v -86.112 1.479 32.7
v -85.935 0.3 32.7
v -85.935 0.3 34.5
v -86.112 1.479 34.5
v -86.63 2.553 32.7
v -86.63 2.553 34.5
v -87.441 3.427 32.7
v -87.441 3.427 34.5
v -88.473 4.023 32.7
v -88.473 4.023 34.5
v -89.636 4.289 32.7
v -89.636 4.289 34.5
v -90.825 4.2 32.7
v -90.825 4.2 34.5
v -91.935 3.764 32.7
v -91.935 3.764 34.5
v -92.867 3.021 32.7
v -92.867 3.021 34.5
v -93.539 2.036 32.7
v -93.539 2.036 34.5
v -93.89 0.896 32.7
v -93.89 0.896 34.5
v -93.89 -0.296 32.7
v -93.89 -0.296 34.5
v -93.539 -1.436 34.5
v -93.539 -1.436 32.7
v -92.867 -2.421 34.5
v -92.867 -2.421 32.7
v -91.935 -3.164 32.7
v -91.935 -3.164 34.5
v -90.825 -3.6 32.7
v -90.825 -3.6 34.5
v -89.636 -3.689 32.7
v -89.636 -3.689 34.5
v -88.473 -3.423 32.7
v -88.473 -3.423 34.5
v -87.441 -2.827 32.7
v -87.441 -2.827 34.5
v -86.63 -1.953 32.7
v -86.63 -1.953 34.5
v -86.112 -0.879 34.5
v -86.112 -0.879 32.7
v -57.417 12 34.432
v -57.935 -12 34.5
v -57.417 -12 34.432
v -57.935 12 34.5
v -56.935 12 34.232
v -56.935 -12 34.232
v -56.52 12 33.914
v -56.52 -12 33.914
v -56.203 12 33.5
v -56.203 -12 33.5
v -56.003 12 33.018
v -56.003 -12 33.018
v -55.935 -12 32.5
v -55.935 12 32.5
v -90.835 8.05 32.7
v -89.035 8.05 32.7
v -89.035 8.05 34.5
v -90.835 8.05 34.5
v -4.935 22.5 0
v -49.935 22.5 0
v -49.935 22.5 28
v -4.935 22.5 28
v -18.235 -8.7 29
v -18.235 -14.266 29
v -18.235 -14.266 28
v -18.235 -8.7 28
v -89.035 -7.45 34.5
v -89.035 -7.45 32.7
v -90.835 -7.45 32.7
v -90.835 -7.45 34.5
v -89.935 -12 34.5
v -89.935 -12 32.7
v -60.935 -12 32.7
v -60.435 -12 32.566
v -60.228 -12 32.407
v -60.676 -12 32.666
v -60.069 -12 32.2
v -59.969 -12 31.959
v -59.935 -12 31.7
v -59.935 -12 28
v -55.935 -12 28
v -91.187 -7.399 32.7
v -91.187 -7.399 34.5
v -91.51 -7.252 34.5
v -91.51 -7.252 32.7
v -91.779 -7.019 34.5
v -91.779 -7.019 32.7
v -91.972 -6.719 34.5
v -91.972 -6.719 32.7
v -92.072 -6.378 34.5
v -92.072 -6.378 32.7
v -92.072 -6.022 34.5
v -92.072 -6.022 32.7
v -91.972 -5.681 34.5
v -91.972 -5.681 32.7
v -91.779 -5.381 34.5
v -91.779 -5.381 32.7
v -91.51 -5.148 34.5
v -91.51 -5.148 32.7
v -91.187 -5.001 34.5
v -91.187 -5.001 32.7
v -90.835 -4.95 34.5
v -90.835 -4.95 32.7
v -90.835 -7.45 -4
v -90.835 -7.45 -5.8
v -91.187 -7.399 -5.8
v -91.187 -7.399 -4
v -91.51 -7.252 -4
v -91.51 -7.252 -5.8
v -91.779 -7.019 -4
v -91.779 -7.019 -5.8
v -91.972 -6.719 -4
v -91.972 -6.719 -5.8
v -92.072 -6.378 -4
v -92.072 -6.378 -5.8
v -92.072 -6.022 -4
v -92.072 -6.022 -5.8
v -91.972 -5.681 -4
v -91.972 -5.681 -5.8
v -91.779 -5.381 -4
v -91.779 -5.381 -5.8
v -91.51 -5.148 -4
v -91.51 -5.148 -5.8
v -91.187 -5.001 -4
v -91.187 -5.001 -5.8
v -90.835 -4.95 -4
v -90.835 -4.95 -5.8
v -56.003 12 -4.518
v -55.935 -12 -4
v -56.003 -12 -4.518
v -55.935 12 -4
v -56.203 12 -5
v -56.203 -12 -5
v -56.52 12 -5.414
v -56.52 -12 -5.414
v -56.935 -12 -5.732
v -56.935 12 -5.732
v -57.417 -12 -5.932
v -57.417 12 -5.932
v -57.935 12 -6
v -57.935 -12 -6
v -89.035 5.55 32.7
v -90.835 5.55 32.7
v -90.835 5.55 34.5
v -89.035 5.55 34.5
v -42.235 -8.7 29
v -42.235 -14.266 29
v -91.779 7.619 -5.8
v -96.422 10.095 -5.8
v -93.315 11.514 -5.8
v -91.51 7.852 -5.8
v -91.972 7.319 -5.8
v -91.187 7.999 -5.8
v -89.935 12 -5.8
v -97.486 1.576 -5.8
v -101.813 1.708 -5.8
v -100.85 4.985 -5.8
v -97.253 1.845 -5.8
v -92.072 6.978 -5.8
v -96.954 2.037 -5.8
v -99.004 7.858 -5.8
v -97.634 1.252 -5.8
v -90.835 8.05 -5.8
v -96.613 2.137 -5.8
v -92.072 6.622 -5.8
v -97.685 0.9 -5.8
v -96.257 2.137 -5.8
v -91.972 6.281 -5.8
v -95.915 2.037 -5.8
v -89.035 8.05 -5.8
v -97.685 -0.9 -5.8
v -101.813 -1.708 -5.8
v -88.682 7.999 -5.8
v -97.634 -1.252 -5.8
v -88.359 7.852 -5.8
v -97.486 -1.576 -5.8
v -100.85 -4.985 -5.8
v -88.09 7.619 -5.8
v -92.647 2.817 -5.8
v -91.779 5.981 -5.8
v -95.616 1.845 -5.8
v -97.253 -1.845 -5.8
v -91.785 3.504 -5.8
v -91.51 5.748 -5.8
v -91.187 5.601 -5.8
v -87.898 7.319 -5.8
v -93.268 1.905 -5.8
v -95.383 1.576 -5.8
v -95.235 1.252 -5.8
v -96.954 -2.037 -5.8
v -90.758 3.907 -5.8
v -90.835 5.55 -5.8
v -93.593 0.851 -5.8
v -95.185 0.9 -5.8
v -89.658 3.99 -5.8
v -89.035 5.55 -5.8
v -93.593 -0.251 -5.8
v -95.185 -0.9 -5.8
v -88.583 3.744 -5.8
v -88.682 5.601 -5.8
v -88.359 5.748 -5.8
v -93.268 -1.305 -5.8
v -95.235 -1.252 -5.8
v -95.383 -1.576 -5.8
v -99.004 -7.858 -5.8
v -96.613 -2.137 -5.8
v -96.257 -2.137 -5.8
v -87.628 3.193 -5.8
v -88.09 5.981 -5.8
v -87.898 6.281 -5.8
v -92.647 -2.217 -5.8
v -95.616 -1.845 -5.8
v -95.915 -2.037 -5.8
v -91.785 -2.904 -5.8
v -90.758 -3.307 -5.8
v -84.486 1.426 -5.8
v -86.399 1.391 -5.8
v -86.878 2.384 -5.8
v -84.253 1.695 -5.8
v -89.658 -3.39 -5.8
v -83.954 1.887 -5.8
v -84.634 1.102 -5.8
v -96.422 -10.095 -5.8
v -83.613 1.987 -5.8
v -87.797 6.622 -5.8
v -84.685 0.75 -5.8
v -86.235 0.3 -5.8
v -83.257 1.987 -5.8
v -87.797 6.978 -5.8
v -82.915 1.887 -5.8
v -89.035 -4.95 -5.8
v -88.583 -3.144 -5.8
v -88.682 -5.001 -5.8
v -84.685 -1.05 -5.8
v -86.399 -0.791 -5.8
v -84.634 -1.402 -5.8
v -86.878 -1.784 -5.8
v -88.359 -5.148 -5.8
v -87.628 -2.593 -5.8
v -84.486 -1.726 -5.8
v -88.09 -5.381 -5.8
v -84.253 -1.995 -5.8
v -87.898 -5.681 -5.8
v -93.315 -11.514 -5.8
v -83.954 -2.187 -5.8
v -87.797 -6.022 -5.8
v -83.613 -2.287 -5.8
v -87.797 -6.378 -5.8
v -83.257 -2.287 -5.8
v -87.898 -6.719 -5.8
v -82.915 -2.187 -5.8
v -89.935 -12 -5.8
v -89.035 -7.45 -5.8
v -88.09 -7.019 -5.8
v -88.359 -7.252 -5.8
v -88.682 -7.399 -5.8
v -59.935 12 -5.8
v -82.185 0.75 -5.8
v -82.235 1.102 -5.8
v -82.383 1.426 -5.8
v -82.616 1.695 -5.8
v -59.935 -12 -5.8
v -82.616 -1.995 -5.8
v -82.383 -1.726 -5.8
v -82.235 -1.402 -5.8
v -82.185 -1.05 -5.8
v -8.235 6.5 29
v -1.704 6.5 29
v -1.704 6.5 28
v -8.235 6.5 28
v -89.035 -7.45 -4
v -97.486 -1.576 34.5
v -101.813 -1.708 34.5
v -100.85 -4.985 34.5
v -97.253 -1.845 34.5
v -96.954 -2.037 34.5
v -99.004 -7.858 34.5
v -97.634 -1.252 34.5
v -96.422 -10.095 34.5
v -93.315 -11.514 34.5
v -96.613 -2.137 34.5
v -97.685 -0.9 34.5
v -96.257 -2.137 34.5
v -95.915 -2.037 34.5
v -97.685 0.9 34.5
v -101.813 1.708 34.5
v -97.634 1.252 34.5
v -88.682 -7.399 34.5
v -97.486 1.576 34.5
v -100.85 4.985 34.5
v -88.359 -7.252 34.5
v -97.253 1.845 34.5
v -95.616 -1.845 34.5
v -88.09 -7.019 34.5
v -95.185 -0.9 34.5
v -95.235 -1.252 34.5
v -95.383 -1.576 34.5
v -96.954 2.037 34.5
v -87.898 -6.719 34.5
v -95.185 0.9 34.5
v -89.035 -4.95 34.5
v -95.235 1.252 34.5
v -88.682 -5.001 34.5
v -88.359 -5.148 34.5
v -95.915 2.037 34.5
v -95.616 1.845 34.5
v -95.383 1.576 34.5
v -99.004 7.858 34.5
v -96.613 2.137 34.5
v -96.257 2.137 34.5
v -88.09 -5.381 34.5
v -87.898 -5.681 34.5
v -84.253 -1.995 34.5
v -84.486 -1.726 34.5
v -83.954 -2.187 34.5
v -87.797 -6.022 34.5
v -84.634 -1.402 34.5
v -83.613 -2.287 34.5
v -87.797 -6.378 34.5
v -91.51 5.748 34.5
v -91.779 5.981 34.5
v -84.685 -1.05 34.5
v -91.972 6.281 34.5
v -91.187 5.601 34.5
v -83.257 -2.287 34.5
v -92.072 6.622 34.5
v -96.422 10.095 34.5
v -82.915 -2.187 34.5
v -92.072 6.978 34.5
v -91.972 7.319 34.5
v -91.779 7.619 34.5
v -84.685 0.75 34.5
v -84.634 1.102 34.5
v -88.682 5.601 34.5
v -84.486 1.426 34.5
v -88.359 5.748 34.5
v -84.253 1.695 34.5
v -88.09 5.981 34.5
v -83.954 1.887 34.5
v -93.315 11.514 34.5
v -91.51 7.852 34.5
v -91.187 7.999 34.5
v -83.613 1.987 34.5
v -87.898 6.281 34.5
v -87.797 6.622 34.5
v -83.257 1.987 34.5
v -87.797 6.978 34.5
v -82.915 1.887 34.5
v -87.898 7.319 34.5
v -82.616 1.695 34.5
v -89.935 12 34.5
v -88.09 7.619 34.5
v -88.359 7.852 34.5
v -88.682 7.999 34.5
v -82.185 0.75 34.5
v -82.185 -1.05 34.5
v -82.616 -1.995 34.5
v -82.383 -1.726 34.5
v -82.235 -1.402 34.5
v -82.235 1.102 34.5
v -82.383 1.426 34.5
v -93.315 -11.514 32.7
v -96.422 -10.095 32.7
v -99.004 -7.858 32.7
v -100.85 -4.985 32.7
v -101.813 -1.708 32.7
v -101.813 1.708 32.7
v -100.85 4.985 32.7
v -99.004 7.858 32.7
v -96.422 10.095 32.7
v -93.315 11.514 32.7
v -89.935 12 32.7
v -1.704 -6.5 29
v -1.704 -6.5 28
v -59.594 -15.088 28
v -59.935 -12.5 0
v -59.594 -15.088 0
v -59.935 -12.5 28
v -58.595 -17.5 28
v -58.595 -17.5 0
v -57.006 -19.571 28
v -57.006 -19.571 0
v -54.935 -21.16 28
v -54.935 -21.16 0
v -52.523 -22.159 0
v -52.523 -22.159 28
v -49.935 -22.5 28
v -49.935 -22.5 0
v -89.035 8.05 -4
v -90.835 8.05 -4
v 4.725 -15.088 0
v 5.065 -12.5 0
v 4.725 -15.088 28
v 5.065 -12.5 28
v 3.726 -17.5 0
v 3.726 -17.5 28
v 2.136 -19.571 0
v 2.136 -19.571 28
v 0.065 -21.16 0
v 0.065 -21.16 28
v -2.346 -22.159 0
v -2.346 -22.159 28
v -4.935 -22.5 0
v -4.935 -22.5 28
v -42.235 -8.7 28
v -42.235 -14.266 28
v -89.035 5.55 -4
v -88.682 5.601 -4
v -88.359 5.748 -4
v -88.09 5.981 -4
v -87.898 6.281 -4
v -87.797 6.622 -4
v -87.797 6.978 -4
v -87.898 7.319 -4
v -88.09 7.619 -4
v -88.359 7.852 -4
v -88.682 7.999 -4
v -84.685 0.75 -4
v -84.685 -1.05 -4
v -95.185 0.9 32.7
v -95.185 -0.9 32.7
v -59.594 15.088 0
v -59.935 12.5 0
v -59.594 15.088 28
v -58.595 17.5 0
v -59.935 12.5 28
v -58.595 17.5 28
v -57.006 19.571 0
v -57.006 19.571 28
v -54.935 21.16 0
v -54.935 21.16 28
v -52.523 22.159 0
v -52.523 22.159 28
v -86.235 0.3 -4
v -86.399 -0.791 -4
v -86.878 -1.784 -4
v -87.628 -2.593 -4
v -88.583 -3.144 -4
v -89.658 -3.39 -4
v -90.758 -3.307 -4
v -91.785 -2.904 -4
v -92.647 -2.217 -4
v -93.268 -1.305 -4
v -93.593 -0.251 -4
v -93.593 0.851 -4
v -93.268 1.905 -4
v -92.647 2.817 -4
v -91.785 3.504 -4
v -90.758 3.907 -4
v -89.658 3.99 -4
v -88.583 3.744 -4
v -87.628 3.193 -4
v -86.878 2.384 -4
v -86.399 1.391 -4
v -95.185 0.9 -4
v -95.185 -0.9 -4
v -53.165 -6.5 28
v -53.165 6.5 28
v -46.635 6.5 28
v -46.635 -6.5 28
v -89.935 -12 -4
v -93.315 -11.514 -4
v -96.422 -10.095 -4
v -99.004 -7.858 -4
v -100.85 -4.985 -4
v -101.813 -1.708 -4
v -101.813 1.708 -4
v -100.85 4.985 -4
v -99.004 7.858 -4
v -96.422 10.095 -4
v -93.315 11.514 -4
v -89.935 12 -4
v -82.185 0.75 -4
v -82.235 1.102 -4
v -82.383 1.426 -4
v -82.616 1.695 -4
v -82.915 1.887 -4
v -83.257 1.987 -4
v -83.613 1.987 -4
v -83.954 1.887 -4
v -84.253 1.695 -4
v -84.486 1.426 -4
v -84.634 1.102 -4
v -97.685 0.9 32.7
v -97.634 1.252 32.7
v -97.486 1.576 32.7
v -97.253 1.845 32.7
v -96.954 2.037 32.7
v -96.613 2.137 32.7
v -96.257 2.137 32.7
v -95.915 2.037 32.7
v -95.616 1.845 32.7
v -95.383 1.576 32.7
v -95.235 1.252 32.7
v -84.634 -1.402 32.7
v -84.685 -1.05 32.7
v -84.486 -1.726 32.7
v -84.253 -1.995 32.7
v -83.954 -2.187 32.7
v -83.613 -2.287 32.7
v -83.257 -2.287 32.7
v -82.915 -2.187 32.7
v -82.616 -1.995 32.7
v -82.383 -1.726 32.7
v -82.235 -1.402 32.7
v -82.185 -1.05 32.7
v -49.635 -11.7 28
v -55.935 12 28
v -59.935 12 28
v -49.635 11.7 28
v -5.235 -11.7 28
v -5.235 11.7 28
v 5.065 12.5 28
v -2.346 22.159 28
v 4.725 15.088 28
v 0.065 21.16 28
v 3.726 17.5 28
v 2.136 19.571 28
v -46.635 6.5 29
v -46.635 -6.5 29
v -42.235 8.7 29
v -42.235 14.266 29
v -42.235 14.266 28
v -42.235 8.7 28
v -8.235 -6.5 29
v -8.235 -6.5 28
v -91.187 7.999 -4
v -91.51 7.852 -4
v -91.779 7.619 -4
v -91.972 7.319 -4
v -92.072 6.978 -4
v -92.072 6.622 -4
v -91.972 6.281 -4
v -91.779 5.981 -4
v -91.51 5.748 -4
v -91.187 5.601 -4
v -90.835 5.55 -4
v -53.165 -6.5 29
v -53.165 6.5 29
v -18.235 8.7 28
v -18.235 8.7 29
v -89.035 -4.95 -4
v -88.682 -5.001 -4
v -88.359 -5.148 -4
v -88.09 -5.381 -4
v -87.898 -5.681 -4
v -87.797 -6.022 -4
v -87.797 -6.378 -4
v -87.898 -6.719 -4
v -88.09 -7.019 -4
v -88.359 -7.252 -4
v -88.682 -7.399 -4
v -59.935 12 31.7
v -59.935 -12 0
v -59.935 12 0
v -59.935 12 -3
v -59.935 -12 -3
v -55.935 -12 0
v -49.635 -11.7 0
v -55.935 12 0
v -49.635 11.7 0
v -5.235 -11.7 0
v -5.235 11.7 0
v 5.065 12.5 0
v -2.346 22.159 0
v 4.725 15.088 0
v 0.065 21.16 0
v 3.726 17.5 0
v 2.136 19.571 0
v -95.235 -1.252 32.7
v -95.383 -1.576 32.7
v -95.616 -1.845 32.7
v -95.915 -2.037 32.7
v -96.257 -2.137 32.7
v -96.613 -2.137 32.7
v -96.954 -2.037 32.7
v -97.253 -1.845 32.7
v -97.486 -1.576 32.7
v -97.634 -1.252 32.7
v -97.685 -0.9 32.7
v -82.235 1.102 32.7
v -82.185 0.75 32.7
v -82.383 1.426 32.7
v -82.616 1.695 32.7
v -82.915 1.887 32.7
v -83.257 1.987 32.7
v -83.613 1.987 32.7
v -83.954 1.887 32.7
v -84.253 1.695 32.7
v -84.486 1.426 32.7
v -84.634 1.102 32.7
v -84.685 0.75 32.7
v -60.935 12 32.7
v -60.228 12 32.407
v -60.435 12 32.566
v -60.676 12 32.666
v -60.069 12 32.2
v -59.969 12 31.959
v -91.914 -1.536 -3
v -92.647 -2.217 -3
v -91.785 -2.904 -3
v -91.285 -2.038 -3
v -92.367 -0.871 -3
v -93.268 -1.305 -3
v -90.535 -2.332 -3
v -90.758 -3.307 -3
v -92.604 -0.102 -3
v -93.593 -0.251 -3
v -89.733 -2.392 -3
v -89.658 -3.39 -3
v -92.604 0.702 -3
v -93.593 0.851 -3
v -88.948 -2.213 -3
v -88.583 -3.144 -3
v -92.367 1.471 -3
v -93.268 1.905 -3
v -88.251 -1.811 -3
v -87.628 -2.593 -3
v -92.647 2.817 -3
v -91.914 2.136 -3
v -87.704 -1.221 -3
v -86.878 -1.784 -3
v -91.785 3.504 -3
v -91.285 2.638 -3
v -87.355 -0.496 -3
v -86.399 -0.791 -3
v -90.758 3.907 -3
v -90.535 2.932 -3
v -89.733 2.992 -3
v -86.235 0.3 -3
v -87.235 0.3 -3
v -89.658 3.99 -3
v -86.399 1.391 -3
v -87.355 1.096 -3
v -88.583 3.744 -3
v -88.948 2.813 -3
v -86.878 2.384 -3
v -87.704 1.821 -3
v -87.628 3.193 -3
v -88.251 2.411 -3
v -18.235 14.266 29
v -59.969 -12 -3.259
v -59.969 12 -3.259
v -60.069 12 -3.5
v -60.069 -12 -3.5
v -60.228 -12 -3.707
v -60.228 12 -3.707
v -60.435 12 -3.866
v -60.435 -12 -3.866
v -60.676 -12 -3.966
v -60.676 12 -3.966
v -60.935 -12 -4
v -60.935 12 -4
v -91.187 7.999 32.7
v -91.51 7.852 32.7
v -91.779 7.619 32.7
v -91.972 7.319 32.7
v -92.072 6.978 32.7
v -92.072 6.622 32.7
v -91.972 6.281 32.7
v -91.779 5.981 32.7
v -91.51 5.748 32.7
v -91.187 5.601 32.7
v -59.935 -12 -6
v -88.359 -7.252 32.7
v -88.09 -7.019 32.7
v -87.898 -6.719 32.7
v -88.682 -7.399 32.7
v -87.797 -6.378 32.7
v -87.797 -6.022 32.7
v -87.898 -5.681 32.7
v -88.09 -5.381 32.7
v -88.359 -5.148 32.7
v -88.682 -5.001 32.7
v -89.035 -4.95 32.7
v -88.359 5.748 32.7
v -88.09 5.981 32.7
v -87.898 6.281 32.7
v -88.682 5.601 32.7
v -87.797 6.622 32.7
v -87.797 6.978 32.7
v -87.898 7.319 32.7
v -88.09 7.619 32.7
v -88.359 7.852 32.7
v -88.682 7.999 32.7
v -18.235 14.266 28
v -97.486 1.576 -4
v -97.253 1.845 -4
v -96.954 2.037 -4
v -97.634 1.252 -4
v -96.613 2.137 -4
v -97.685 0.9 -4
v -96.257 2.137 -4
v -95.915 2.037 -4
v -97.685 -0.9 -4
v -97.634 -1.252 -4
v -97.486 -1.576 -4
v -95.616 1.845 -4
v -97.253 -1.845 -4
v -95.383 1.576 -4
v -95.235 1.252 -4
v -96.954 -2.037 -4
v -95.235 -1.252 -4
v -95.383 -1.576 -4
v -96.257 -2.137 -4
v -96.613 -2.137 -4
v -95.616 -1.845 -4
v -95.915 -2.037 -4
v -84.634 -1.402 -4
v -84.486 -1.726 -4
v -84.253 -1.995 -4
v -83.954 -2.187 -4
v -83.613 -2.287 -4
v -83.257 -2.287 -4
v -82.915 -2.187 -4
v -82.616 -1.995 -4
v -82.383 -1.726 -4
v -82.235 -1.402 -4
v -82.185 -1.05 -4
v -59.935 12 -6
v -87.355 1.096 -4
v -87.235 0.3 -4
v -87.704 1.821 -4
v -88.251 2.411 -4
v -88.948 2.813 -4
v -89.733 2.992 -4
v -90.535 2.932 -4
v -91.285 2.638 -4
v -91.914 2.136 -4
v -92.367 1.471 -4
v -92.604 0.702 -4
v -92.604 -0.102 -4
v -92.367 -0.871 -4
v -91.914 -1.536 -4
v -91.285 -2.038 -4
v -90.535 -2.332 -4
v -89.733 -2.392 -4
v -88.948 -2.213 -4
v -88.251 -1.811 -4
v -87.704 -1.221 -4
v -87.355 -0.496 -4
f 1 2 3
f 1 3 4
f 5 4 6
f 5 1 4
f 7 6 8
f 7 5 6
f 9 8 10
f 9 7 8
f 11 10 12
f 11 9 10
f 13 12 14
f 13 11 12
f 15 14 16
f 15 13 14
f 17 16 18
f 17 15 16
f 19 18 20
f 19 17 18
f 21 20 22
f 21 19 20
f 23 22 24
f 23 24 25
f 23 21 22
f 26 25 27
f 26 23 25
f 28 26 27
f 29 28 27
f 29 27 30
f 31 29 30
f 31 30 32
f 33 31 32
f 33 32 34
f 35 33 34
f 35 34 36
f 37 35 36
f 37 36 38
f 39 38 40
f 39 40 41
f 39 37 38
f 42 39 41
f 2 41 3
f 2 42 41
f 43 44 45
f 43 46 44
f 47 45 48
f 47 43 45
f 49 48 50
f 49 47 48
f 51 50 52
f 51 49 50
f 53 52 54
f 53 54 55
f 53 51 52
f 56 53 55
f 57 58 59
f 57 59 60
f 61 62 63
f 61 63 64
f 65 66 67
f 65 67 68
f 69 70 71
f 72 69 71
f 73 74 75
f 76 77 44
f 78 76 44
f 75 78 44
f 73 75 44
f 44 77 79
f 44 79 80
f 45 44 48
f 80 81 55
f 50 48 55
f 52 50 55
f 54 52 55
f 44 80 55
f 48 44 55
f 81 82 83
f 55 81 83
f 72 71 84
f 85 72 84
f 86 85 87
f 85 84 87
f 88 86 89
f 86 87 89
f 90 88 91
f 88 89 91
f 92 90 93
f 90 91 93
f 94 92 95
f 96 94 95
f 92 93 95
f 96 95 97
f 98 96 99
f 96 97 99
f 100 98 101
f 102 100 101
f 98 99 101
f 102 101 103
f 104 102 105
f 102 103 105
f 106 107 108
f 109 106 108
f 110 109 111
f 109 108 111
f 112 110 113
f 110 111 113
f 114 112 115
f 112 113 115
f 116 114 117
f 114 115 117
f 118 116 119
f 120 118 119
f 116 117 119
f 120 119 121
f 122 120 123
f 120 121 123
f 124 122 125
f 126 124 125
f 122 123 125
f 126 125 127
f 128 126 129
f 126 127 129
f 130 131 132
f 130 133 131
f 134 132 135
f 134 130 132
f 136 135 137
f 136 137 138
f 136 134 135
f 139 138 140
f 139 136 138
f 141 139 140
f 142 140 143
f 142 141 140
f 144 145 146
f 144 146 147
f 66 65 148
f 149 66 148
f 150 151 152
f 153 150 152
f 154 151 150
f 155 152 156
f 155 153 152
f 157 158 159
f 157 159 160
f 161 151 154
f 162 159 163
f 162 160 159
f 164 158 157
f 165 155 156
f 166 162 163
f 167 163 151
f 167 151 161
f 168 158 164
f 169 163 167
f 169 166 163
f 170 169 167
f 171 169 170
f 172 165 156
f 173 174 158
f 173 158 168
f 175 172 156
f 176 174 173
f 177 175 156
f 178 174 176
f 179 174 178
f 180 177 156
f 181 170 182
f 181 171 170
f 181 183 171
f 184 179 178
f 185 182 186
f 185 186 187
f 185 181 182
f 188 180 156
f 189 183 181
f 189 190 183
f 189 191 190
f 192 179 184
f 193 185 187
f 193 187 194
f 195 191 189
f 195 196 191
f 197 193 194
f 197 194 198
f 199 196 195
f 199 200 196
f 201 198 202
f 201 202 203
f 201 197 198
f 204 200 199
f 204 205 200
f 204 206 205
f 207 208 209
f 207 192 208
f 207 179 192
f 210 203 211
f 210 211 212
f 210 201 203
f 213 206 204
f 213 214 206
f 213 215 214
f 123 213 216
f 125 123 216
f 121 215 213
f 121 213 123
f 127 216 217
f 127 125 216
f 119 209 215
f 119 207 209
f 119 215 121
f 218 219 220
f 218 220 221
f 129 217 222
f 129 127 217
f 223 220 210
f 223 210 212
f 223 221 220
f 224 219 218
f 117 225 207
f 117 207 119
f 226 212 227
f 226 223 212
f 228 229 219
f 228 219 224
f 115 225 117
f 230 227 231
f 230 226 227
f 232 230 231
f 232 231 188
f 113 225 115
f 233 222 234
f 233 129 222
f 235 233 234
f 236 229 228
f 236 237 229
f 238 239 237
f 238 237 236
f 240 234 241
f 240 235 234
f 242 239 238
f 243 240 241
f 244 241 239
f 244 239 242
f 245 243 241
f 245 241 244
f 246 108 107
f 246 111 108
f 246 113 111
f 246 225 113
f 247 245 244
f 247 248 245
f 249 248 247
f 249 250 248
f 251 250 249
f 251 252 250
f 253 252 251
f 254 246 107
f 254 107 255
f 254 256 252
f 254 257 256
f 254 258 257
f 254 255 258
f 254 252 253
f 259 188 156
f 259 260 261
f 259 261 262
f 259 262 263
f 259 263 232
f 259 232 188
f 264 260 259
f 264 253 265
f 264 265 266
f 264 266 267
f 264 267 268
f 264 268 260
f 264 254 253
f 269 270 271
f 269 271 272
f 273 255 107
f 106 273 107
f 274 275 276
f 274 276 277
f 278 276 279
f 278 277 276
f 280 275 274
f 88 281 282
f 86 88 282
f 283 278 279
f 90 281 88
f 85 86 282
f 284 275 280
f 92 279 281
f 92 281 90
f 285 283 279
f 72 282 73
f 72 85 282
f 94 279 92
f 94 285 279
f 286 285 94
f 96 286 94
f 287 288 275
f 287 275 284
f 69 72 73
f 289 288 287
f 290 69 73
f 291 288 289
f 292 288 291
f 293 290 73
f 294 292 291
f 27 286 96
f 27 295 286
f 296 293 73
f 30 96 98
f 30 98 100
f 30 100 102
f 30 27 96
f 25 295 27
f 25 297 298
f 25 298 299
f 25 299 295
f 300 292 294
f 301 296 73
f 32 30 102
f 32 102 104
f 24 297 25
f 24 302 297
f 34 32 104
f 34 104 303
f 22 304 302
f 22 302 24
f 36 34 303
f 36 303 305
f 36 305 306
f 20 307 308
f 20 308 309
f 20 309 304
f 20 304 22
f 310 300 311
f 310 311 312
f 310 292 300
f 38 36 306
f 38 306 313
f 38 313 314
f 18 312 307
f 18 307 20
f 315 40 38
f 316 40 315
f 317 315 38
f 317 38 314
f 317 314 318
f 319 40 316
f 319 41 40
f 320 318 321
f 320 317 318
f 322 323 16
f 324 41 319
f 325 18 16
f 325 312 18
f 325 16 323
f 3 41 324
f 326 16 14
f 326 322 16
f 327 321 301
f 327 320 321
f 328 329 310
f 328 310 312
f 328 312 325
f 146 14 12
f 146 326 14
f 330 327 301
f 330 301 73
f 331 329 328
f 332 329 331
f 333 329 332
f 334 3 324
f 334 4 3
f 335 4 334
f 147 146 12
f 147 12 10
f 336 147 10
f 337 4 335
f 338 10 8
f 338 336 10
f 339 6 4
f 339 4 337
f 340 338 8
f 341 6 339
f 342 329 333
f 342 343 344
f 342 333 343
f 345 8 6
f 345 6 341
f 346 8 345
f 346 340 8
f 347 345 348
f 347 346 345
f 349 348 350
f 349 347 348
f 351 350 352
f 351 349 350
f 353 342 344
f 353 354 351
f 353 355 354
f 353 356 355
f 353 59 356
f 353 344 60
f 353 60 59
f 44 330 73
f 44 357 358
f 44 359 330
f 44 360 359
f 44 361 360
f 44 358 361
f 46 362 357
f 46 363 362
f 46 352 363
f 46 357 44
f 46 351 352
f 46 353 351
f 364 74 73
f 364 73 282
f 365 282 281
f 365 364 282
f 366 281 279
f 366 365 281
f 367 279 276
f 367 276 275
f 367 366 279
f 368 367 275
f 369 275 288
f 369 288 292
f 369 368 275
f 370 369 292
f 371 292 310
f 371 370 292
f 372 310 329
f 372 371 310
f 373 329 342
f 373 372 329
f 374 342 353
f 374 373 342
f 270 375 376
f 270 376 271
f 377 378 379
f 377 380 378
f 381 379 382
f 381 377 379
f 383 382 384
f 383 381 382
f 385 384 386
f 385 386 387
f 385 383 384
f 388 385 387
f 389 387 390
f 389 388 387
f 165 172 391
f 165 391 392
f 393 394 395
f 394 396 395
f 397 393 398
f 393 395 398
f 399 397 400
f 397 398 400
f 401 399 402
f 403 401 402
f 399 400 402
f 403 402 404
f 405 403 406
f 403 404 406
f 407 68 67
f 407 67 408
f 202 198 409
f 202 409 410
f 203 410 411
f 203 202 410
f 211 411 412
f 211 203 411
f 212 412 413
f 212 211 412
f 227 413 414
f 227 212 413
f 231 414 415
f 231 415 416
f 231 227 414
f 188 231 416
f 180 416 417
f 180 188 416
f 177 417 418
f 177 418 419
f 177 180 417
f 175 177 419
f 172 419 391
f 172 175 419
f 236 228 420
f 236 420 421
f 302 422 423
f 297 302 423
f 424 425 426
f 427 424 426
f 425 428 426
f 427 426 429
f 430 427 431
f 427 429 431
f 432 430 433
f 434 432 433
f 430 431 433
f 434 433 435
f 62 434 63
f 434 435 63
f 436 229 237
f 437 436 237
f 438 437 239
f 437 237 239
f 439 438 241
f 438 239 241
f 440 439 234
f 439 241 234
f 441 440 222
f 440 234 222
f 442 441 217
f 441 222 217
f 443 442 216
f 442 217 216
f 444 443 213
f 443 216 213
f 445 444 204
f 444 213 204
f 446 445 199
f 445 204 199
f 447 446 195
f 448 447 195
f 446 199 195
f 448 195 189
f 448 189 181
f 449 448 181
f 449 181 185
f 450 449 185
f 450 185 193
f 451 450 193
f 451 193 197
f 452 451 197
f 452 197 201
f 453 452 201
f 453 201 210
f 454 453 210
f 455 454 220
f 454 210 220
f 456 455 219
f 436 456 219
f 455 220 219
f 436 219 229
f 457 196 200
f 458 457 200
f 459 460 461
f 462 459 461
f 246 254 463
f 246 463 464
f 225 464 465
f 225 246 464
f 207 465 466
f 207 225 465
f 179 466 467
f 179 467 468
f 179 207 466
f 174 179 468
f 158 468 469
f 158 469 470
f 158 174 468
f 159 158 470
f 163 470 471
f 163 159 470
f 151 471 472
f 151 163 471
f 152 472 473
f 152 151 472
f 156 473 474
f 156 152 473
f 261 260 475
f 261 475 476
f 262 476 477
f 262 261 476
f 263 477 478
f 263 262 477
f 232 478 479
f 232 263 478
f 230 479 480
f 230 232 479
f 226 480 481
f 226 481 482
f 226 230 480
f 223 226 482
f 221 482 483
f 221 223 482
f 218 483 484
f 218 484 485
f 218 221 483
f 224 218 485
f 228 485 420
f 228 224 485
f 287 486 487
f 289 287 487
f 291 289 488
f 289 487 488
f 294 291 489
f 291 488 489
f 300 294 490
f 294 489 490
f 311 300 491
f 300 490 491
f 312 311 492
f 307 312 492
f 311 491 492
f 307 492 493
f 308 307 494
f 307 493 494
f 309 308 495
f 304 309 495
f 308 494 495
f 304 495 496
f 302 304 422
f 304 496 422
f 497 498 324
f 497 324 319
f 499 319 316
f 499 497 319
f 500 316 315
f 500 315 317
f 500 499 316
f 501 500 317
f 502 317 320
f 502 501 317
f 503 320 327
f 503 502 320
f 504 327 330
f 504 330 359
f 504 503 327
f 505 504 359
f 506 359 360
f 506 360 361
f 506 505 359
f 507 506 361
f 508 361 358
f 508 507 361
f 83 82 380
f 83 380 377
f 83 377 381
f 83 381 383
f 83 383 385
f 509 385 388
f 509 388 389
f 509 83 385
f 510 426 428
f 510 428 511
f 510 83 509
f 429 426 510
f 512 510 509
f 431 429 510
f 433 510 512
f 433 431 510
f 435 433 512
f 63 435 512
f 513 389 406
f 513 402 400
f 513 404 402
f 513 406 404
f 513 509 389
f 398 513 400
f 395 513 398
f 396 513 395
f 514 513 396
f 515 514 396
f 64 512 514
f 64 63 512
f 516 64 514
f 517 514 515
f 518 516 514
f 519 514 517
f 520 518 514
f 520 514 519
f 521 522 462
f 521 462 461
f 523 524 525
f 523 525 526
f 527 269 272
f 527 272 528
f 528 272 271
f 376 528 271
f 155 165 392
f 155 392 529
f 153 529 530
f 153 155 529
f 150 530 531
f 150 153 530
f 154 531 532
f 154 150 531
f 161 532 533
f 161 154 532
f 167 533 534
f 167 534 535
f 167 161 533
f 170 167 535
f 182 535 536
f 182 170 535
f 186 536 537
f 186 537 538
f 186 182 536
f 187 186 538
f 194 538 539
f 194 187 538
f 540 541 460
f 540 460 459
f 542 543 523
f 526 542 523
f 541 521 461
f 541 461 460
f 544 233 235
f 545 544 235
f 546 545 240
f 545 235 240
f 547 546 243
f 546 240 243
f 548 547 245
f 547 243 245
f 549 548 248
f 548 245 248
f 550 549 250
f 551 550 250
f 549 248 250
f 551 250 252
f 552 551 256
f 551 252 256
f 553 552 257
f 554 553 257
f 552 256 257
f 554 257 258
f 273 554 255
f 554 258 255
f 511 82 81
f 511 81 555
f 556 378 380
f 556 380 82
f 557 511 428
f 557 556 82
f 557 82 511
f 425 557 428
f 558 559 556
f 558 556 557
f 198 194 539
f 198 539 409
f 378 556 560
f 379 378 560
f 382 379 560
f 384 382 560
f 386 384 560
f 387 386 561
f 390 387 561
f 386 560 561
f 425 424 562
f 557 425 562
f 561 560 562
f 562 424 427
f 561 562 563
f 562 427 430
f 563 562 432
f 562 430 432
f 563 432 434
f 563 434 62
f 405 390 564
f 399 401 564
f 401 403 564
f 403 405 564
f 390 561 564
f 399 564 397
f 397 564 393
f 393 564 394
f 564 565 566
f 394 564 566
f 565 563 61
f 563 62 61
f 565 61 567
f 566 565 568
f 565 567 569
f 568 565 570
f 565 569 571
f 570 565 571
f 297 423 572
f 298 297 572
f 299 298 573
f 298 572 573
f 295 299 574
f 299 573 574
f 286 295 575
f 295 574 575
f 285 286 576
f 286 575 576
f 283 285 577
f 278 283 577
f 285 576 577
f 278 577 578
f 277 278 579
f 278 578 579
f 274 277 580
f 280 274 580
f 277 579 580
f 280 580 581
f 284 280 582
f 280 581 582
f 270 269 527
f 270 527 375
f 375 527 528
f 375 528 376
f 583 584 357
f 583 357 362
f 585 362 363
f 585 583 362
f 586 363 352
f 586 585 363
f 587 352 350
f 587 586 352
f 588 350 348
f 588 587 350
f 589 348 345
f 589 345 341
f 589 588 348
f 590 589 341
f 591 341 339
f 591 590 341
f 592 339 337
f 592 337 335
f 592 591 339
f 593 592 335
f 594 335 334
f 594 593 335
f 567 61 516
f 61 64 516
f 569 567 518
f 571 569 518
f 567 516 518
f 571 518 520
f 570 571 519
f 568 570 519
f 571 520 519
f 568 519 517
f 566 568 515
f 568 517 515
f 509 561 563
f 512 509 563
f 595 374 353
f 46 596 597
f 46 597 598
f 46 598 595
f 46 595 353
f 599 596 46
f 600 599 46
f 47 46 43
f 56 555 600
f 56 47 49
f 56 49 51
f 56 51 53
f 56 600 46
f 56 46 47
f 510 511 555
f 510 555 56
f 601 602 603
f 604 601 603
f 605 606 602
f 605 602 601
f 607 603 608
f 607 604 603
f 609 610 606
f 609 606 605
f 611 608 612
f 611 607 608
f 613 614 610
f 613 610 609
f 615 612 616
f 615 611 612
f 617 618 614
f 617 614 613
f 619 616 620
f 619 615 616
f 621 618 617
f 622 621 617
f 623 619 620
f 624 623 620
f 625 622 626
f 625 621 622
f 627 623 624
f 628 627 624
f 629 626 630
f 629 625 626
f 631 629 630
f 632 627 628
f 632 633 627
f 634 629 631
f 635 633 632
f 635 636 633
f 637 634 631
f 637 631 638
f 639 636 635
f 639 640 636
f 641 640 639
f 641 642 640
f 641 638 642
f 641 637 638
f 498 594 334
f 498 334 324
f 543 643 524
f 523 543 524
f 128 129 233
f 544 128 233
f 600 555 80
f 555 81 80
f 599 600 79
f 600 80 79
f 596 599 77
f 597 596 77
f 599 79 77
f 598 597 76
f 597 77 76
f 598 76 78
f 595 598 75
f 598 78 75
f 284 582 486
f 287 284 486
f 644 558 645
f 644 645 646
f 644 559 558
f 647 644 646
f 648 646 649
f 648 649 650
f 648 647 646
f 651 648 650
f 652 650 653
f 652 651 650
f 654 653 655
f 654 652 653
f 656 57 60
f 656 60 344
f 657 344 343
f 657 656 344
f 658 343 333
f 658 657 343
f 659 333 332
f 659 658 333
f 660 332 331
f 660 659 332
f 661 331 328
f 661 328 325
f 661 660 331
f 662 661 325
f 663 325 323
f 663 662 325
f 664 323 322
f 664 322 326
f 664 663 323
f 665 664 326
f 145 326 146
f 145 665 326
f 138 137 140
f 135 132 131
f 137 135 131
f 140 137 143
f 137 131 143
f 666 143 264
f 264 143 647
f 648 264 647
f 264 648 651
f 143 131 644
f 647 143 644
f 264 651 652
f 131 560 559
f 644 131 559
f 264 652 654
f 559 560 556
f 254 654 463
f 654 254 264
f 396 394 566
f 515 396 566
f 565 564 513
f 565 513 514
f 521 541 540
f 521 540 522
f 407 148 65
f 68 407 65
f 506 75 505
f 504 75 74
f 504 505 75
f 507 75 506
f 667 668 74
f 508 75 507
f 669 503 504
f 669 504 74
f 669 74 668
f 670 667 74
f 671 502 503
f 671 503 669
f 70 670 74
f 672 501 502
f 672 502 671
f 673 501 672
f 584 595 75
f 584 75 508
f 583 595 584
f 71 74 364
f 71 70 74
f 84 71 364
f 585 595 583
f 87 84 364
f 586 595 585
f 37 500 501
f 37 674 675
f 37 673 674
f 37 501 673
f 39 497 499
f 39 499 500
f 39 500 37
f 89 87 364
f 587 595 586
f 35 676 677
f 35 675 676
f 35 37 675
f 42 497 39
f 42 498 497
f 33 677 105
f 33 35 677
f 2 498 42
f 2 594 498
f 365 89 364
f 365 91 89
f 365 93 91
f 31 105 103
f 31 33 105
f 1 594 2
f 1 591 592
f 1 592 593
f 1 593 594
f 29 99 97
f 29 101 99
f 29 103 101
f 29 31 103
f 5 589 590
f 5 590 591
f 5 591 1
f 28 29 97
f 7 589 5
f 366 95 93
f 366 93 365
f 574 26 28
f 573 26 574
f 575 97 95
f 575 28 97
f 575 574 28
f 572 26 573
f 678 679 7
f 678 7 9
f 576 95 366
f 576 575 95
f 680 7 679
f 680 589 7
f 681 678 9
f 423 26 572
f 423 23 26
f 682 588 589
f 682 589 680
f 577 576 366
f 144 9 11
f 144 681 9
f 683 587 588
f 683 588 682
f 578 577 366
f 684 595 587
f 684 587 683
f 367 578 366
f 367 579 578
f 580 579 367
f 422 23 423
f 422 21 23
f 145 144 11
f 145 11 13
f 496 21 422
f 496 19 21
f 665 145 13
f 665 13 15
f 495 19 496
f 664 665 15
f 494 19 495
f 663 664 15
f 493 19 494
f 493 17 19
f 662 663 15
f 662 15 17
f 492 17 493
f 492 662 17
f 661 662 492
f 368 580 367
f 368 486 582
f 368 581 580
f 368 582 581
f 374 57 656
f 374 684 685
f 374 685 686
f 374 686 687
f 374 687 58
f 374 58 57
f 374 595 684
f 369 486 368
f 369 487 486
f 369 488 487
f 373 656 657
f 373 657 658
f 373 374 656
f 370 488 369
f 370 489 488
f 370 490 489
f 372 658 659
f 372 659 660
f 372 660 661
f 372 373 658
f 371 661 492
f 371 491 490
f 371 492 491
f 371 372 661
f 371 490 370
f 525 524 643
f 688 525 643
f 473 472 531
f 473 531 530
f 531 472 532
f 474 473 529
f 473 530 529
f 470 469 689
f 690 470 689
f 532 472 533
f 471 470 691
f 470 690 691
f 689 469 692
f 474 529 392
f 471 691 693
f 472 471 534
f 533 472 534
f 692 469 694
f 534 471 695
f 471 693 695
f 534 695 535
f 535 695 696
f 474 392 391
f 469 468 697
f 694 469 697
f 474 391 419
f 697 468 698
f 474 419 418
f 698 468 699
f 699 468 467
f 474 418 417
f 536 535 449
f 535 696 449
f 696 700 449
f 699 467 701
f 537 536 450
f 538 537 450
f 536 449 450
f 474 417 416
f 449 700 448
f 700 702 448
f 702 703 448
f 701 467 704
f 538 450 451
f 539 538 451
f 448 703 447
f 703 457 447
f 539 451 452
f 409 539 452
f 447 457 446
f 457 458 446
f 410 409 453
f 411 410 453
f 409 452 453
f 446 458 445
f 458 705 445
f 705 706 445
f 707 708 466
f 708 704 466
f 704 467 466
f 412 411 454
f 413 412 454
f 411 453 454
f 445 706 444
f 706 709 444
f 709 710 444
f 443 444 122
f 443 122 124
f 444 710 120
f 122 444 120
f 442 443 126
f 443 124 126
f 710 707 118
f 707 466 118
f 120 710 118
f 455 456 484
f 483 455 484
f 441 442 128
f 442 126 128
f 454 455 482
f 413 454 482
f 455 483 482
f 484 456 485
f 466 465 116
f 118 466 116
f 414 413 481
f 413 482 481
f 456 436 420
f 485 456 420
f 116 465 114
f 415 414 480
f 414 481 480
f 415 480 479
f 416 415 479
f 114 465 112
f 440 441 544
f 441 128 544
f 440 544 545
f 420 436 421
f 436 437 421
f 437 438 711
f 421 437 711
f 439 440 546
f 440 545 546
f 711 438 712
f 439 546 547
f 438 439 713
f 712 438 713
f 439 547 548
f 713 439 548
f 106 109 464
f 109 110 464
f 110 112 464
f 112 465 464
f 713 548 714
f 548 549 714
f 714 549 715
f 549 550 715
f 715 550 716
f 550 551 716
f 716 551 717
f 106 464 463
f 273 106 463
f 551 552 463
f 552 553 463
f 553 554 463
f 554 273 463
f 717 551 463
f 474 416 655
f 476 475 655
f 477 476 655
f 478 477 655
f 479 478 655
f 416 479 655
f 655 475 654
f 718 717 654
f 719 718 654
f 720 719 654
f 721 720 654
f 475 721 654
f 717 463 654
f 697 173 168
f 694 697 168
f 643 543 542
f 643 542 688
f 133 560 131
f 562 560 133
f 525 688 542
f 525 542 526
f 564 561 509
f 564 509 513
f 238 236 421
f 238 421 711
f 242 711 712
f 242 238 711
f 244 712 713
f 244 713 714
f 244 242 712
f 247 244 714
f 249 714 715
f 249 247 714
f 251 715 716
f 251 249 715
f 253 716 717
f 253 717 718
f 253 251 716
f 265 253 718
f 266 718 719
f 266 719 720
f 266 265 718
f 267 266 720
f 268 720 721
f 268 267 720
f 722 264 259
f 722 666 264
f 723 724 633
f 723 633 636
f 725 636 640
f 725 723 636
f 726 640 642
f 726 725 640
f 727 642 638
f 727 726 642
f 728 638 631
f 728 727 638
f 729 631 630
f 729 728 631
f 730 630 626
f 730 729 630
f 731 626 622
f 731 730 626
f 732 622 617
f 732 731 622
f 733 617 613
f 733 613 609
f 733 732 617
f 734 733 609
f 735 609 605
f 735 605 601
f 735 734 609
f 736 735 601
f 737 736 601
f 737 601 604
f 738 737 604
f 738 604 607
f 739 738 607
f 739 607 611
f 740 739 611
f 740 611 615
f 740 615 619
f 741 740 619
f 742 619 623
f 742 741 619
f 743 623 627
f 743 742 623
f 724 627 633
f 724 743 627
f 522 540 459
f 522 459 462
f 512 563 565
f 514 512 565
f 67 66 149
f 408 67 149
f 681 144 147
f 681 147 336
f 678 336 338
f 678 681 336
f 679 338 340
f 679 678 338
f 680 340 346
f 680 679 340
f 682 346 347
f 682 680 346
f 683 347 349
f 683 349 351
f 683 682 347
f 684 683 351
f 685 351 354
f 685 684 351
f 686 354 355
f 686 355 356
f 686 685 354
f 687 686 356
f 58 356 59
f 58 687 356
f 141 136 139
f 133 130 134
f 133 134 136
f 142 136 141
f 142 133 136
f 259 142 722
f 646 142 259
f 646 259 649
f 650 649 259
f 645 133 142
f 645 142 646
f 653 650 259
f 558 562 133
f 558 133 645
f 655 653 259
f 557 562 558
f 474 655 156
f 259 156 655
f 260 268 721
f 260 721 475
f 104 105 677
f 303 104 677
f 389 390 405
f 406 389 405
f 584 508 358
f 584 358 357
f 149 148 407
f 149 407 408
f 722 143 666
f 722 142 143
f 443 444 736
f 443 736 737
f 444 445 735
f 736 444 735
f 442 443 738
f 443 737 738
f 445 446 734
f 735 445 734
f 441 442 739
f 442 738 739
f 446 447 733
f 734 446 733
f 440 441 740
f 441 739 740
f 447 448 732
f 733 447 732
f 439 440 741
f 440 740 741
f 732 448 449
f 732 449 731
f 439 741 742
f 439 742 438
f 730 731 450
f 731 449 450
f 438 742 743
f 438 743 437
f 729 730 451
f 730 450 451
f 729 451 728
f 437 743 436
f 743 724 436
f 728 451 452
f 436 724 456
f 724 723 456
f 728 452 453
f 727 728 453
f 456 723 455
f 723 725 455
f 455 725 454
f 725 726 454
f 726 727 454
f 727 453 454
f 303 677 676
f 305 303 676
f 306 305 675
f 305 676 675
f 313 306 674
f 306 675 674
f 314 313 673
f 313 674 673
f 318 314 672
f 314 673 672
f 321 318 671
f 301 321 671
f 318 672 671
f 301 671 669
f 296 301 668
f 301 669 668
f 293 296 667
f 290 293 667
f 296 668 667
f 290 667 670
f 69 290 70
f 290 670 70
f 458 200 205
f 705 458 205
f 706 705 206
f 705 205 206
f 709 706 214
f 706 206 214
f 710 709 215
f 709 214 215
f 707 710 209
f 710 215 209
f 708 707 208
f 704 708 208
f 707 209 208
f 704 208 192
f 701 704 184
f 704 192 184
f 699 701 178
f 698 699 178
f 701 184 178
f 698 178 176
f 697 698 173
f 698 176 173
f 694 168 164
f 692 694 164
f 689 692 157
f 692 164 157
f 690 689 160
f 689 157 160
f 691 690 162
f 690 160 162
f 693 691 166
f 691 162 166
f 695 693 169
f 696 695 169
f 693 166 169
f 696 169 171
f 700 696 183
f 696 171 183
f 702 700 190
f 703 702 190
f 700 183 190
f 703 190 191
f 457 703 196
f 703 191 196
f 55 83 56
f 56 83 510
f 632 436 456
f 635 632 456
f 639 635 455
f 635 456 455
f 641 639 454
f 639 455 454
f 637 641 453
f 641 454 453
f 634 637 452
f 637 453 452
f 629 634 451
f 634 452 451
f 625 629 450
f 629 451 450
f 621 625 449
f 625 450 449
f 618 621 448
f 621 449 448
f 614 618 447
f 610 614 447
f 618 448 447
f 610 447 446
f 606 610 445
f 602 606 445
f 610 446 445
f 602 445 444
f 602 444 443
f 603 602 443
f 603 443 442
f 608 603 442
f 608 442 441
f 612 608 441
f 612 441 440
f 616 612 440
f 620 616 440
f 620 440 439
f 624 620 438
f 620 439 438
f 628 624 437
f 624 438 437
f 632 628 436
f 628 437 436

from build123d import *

# Parameters (mm, degrees)
SKETCH_1_W             = 65
SKETCH_1_H             = 45
EXTRUDE_1_DEPTH        = 28
SKETCH_2_W             = 44.4
SKETCH_2_H             = 23.4
CUT_EXTRUDE_1_DEPTH    = 39
SKETCH_3_W             = 4
SKETCH_3_H             = 24
EXTRUDE_2_DEPTH        = 6
EXTRUDE_START          = -0.3
SKETCH_7_R             = 4
EXTRUDE_3_DEPTH        = 1.8
SKETCH_8_W             = 4
SKETCH_8_H             = 24
EXTRUDE_4_DEPTH        = 6
FILLET_1_R             = 10
FILLET_2_R             = 10
FILLET_3_R             = 10
FILLET_4_R             = 10
PATTERN_LINEAR_2_COUNT = 2
PATTERN_LINEAR_2_PITCH = 38.5
FILLET_5_R             = 2
SKETCH_9_R             = 3.7
SKETCH_9_R_2           = 2.7
EXTRUDE_5_DEPTH        = 1
EXTRUDE_6_DEPTH        = 1
EXTRUDE_6_2_DEPTH      = 1
EXTRUDE_6_3_DEPTH      = 1
EXTRUDE_6_4_DEPTH      = 1
EXTRUDE_START_2        = 1.8
SKETCH_12_R            = 4
SKETCH_12_R_2          = 3.7
EXTRUDE_8_DEPTH        = 1.8
SKETCH_15_W            = 4
SKETCH_15_H            = 24
EXTRUDE_10_DEPTH       = 0.5
FILLET_16_R            = 2
FILLET_17_R            = 1
FILLET_18_R            = 1


with BuildPart() as part:
    # 草圖1 → 填料-伸長1 (new body)
    with BuildSketch(Plane.XY):
        with Locations((-27.434655272, 0)):
            Rectangle(SKETCH_1_W, SKETCH_1_H)
    extrude(amount=EXTRUDE_1_DEPTH)

    # 草圖2 → 除料-伸長1 (cut)
    with BuildSketch(Plane.XY):
        with Locations((-27.434655272, 0)):
            Rectangle(SKETCH_2_W, SKETCH_2_H)
    extrude(amount=CUT_EXTRUDE_1_DEPTH, mode=Mode.SUBTRACT)

    # 草圖3 → 填料-伸長2 (add)
    with BuildSketch(Plane.XY.offset(28)):
        with Locations((-57.934655272, 0)):
            Rectangle(SKETCH_3_W, SKETCH_3_H)
    extrude(amount=EXTRUDE_2_DEPTH)

    # 草圖7 → 填料-伸長3 (add)
    with BuildSketch(Plane.XY.offset(33).offset(EXTRUDE_START)):
        with BuildLine():
            Line((-59.934655272, 12), (-59.934655272, -12))
            Line((-59.934655272, -12), (-89.934655272, -12))
            ThreePointArc((-89.934655272, -12), (-101.934655272, 0), (-89.934655272, 12))
            Line((-89.934655272, 12), (-59.934655272, 12))
        make_face()
        with Locations((-89.934655272, 0.3)):
            Circle(SKETCH_7_R, mode=Mode.SUBTRACT)
        with BuildLine():
            Line((-95.184655272, 0.9), (-95.184655272, -0.9))
            ThreePointArc((-95.184655272, -0.9), (-96.434655272, -2.15), (-97.684655272, -0.9))
            Line((-97.684655272, -0.9), (-97.684655272, 0.9))
            ThreePointArc((-97.684655272, 0.9), (-96.434655272, 2.15), (-95.184655272, 0.9))
        make_face(mode=Mode.SUBTRACT)
        with BuildLine():
            Line((-90.834655272, -4.95), (-89.034655272, -4.95))
            ThreePointArc((-89.034655272, -4.95), (-87.784655272, -6.2), (-89.034655272, -7.45))
            Line((-89.034655272, -7.45), (-90.834655272, -7.45))
            ThreePointArc((-90.834655272, -7.45), (-92.084655272, -6.2), (-90.834655272, -4.95))
        make_face(mode=Mode.SUBTRACT)
        with BuildLine():
            Line((-90.834655272, 5.55), (-89.034655272, 5.55))
            ThreePointArc((-89.034655272, 5.55), (-87.784655272, 6.8), (-89.034655272, 8.05))
            Line((-89.034655272, 8.05), (-90.834655272, 8.05))
            ThreePointArc((-90.834655272, 8.05), (-92.084655272, 6.8), (-90.834655272, 5.55))
        make_face(mode=Mode.SUBTRACT)
        with BuildLine():
            Line((-84.684655272, 0.75), (-84.684655272, -1.05))
            ThreePointArc((-84.684655272, -1.05), (-83.434655272, -2.3), (-82.184655272, -1.05))
            Line((-82.184655272, -1.05), (-82.184655272, 0.75))
            ThreePointArc((-82.184655272, 0.75), (-83.434655272, 2), (-84.684655272, 0.75))
        make_face(mode=Mode.SUBTRACT)
    extrude_3 = extrude(amount=EXTRUDE_3_DEPTH)

    # 草圖8 → 填料-伸長4 (add)
    with BuildSketch(Plane(origin=(0, 0, 0), x_dir=(-1, 0, 0), z_dir=(0, 0, -1))):
        with Locations((57.934655272, 0)):
            Rectangle(SKETCH_8_W, SKETCH_8_H)
    extrude(amount=EXTRUDE_4_DEPTH)

    # 圓角1
    fillet_1_edges = [part.edges().sort_by_distance(p)[0] for p in [
        (-59.934655272, -22.5, 14),
    ]]
    fillet(fillet_1_edges, radius=FILLET_1_R)

    # 圓角2
    fillet_2_edges = [part.edges().sort_by_distance(p)[0] for p in [
        (-59.934655272, 22.5, 14),
    ]]
    fillet(fillet_2_edges, radius=FILLET_2_R)

    # 圓角3
    fillet_3_edges = [part.edges().sort_by_distance(p)[0] for p in [
        (5.065344728, 22.5, 14),
    ]]
    fillet(fillet_3_edges, radius=FILLET_3_R)

    # 圓角4
    fillet_4_edges = [part.edges().sort_by_distance(p)[0] for p in [
        (5.065344728, -22.5, 14),
    ]]
    fillet(fillet_4_edges, radius=FILLET_4_R)

    # 直線複製排列2: 填料-伸長3 ×2
    with Locations(*[(0, 0, -i * PATTERN_LINEAR_2_PITCH) for i in range(1, PATTERN_LINEAR_2_COUNT)]):
        add(extrude_3)

    # 圓角5
    fillet_5_edges = [part.edges().sort_by_distance(p)[0] for p in [
        (-55.934655272, 0, -6),
    ]]
    fillet(fillet_5_edges, radius=FILLET_5_R)

    # 草圖12 → 填料-伸長8 (add)
    with BuildSketch(Plane(origin=(0, 0, -4), x_dir=(-1, 0, 0), z_dir=(0, 0, -1)).offset(EXTRUDE_START_2)):
        with Locations(Location((89.934655272, 0.3, 0), (0, 0, 180))):
            Circle(SKETCH_12_R)
        with Locations(Location((89.934655272, 0.3, 0), (0, 0, 180))):
            Circle(SKETCH_12_R_2, mode=Mode.SUBTRACT)
    extrude(amount=-EXTRUDE_8_DEPTH)

    # 草圖15 → 填料-伸長10 (add)
    with BuildSketch(Plane.XY.offset(34)):
        with Locations((-57.934655272, 0)):
            Rectangle(SKETCH_15_W, SKETCH_15_H)
    extrude(amount=EXTRUDE_10_DEPTH)

    # 圓角16
    fillet_16_edges = [part.edges().sort_by_distance(p)[0] for p in [
        (-55.934655272, 0, 34.5),
    ]]
    fillet(fillet_16_edges, radius=FILLET_16_R)

    # 圓角17
    fillet_17_edges = [part.edges().sort_by_distance(p)[0] for p in [
        (-59.934655272, 0, 32.7),
    ]]
    fillet(fillet_17_edges, radius=FILLET_17_R)

    # 圓角18
    fillet_18_edges = [part.edges().sort_by_distance(p)[0] for p in [
        (-59.934655272, 0, -4),
    ]]
    fillet(fillet_18_edges, radius=FILLET_18_R)


with BuildPart() as body_2:
    # 草圖9 → 填料-伸長5 (new body)
    with BuildSketch(Plane.XY.offset(-4)):
        with Locations((-89.934655272, 0.3)):
            Circle(SKETCH_9_R)
        with Locations((-89.934655272, 0.3)):
            Circle(SKETCH_9_R_2, mode=Mode.SUBTRACT)
    extrude(amount=EXTRUDE_5_DEPTH)


with BuildPart() as body_3:
    # 草圖10 → 填料-伸長6 (new body)
    with BuildSketch(Plane.XY.offset(29)):
        Polygon((-42.234655272, 11.7), (-42.234655272, 14.266291238), (-18.234655272, 14.266291238), (-18.234655272, 11.7), (-18.234655272, 8.7), (-42.234655272, 8.7), align=None)
    extrude(amount=-EXTRUDE_6_DEPTH)


with BuildPart() as body_4:
    # 草圖10 → Extrude 6 2 (new body)
    with BuildSketch(Plane.XY.offset(29)):
        Polygon((-49.634655272, 6.5), (-53.165057103, 6.5), (-53.165057103, -6.5), (-49.634655272, -6.5), (-46.634655272, -6.5), (-46.634655272, 6.5), align=None)
    extrude(amount=-EXTRUDE_6_2_DEPTH)


with BuildPart() as body_5:
    # 草圖10 → Extrude 6 3 (new body)
    with BuildSketch(Plane.XY.offset(29)):
        Polygon((-42.234655272, -11.7), (-42.234655272, -8.7), (-18.234655272, -8.7), (-18.234655272, -11.7), (-18.234655272, -14.266291238), (-42.234655272, -14.266291238), align=None)
    extrude(amount=-EXTRUDE_6_3_DEPTH)


with BuildPart() as body_6:
    # 草圖10 → Extrude 6 4 (new body)
    with BuildSketch(Plane.XY.offset(29)):
        Polygon((-5.234655272, 6.5), (-8.234655272, 6.5), (-8.234655272, -6.5), (-5.234655272, -6.5), (-1.70425344, -6.5), (-1.70425344, 6.5), align=None)
    extrude(amount=-EXTRUDE_6_4_DEPTH)


solid = Compound([part.part, body_2.part, body_3.part, body_4.part, body_5.part, body_6.part])
